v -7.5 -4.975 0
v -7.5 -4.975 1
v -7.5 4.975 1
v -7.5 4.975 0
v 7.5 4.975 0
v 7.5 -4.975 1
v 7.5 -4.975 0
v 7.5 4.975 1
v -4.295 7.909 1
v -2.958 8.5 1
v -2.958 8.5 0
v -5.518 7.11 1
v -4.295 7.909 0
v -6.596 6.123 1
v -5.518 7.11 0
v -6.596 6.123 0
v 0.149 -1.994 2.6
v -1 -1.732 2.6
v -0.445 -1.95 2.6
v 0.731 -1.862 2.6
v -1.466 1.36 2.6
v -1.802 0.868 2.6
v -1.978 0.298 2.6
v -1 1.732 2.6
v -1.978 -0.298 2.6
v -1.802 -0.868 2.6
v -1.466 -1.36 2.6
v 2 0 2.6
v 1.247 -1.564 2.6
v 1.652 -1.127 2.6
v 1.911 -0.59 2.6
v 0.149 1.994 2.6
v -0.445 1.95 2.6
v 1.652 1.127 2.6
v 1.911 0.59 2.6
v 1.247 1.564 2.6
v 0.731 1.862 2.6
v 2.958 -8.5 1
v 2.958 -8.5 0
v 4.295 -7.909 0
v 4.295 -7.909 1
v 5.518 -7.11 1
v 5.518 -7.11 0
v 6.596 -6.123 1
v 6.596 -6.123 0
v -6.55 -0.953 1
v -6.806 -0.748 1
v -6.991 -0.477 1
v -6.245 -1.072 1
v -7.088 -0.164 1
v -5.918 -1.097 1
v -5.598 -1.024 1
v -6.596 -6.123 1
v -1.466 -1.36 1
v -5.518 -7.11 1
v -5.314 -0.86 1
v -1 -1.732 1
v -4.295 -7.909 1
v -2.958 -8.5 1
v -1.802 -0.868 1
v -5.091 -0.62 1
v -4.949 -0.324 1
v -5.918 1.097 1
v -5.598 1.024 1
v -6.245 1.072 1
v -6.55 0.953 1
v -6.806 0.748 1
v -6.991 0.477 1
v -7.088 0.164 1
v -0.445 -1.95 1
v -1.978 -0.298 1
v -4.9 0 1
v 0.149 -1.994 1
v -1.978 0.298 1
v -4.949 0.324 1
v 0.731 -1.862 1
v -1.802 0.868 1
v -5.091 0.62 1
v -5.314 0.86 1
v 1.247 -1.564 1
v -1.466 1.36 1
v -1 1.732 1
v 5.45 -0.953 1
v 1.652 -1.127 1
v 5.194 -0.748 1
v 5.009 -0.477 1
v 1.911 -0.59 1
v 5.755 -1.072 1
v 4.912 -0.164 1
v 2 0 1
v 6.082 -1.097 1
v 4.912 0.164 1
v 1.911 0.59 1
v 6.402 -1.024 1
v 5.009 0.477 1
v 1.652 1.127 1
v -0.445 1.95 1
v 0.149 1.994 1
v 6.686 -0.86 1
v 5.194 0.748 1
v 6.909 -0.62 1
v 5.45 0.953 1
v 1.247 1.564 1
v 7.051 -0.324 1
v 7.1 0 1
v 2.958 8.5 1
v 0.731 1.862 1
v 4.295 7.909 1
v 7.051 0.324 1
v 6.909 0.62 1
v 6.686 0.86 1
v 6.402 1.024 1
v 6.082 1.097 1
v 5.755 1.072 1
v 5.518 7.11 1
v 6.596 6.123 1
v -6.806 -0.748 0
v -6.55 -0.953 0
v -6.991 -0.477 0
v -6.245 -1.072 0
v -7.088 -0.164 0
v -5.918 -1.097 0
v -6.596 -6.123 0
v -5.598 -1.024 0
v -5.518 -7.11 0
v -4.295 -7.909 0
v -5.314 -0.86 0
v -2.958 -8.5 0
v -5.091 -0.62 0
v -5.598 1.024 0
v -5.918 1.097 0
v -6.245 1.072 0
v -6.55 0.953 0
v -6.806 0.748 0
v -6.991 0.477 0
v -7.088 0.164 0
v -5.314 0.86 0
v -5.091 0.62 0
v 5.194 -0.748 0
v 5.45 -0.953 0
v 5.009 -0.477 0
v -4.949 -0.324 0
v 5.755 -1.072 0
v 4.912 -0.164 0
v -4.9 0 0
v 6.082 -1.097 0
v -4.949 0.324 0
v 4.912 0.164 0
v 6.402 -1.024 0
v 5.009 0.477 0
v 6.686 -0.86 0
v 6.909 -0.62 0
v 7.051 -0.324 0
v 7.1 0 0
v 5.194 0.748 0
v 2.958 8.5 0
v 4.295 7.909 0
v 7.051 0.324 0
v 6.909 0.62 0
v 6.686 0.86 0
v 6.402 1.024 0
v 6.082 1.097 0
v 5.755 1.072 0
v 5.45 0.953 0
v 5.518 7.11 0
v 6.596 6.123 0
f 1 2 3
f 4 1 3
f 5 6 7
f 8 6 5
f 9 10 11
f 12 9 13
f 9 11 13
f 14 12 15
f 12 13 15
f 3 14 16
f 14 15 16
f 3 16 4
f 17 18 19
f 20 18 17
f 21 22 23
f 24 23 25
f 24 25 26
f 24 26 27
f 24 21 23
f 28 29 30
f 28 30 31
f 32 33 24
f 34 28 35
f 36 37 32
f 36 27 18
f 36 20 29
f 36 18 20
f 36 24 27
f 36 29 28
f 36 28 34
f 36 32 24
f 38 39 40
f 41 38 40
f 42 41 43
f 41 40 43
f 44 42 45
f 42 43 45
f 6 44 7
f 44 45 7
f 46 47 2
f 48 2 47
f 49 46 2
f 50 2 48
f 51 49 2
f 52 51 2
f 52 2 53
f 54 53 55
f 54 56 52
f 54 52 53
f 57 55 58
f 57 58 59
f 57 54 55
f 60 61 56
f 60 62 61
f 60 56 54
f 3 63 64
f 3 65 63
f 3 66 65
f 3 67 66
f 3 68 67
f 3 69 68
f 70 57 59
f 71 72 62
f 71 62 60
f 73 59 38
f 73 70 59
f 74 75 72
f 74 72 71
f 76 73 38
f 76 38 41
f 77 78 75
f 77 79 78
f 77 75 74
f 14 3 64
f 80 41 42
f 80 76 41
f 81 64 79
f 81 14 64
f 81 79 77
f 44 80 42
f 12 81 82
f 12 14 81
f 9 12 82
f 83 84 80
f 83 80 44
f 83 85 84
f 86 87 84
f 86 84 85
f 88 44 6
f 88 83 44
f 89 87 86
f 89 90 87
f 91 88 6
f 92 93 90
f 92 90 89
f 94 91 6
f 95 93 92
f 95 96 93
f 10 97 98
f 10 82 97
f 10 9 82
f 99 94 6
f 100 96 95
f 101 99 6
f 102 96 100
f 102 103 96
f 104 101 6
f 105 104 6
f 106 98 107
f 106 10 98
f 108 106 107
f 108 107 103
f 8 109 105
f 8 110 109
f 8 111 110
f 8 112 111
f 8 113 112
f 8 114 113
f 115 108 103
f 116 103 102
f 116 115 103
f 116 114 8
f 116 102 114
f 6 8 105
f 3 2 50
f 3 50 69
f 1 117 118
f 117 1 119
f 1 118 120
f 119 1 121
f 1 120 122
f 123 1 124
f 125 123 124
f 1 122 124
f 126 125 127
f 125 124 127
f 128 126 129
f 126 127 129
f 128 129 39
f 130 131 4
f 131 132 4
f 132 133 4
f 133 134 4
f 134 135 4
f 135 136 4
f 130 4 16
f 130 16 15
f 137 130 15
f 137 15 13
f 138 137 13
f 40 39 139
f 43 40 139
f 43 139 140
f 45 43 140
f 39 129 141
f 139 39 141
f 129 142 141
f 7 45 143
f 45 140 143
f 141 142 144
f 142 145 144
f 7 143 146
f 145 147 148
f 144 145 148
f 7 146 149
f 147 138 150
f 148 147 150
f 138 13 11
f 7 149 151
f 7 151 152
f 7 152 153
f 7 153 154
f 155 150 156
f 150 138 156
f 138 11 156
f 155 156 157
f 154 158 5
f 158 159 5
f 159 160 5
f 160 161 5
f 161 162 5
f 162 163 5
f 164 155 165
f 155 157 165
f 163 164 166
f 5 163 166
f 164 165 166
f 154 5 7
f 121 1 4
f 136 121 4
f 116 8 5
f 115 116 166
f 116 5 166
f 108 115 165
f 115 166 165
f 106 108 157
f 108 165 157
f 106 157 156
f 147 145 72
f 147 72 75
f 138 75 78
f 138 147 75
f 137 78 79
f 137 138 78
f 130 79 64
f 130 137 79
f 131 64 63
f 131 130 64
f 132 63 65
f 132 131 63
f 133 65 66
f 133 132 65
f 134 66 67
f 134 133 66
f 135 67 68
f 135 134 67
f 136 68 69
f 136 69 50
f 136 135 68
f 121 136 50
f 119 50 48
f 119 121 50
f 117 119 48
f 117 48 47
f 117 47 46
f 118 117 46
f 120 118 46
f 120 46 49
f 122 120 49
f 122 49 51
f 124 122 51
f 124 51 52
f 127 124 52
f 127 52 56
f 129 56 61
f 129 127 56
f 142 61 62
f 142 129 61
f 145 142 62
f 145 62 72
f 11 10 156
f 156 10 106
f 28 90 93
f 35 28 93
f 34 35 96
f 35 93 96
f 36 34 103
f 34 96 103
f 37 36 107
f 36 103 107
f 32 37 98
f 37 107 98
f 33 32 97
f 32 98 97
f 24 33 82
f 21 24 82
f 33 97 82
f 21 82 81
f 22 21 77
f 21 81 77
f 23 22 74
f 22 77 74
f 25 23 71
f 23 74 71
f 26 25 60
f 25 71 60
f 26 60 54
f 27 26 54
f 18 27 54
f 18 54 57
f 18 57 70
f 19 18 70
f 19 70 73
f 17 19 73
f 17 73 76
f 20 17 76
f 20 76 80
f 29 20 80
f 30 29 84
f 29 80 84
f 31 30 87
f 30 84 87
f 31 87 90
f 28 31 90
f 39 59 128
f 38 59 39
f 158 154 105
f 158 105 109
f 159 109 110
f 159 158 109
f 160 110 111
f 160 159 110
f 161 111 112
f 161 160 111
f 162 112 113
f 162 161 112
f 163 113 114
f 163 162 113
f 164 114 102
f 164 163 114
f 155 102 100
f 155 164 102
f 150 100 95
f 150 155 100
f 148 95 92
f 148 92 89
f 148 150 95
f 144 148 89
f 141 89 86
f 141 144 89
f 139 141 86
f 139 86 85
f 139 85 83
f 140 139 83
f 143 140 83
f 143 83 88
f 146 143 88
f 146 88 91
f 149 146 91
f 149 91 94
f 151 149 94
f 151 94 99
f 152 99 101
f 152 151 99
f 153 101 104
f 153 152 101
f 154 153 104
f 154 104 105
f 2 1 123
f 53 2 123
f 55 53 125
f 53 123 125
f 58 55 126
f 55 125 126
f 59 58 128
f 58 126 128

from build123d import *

# Parameters (mm, degrees)
SKETCH_1_R          = 9
SKETCH_1_R_2        = 1.1
EXTRUDE_1_DEPTH     = 1
SKETCH_2_W          = 32.389432278
SKETCH_2_H          = 26.120675296
SKETCH_2_W_2        = 15
SKETCH_2_H_2        = 17
CUT_EXTRUDE_1_DEPTH = 2
SKETCH_3_R          = 2
EXTRUDE_2_DEPTH     = 1.6


with BuildPart() as part:
    # 草图1 → 凸台-拉伸1 (new body)
    with BuildSketch(Plane.XY):
        Circle(SKETCH_1_R)
        with Locations((6, 0)):
            Circle(SKETCH_1_R_2, mode=Mode.SUBTRACT)
        with Locations((-6, 0)):
            Circle(SKETCH_1_R_2, mode=Mode.SUBTRACT)
    extrude(amount=EXTRUDE_1_DEPTH)

    # 草图2 → 切除-拉伸1 (cut)
    with BuildSketch(Plane.XY.offset(1)):
        Rectangle(SKETCH_2_W, SKETCH_2_H)
        Rectangle(SKETCH_2_W_2, SKETCH_2_H_2, mode=Mode.SUBTRACT)
    extrude(amount=-CUT_EXTRUDE_1_DEPTH, mode=Mode.SUBTRACT)

    # 草图3 → 凸台-拉伸2 (add)
    with BuildSketch(Plane.XY.offset(1)):
        Circle(SKETCH_3_R)
    extrude(amount=EXTRUDE_2_DEPTH)


solid = part.part
